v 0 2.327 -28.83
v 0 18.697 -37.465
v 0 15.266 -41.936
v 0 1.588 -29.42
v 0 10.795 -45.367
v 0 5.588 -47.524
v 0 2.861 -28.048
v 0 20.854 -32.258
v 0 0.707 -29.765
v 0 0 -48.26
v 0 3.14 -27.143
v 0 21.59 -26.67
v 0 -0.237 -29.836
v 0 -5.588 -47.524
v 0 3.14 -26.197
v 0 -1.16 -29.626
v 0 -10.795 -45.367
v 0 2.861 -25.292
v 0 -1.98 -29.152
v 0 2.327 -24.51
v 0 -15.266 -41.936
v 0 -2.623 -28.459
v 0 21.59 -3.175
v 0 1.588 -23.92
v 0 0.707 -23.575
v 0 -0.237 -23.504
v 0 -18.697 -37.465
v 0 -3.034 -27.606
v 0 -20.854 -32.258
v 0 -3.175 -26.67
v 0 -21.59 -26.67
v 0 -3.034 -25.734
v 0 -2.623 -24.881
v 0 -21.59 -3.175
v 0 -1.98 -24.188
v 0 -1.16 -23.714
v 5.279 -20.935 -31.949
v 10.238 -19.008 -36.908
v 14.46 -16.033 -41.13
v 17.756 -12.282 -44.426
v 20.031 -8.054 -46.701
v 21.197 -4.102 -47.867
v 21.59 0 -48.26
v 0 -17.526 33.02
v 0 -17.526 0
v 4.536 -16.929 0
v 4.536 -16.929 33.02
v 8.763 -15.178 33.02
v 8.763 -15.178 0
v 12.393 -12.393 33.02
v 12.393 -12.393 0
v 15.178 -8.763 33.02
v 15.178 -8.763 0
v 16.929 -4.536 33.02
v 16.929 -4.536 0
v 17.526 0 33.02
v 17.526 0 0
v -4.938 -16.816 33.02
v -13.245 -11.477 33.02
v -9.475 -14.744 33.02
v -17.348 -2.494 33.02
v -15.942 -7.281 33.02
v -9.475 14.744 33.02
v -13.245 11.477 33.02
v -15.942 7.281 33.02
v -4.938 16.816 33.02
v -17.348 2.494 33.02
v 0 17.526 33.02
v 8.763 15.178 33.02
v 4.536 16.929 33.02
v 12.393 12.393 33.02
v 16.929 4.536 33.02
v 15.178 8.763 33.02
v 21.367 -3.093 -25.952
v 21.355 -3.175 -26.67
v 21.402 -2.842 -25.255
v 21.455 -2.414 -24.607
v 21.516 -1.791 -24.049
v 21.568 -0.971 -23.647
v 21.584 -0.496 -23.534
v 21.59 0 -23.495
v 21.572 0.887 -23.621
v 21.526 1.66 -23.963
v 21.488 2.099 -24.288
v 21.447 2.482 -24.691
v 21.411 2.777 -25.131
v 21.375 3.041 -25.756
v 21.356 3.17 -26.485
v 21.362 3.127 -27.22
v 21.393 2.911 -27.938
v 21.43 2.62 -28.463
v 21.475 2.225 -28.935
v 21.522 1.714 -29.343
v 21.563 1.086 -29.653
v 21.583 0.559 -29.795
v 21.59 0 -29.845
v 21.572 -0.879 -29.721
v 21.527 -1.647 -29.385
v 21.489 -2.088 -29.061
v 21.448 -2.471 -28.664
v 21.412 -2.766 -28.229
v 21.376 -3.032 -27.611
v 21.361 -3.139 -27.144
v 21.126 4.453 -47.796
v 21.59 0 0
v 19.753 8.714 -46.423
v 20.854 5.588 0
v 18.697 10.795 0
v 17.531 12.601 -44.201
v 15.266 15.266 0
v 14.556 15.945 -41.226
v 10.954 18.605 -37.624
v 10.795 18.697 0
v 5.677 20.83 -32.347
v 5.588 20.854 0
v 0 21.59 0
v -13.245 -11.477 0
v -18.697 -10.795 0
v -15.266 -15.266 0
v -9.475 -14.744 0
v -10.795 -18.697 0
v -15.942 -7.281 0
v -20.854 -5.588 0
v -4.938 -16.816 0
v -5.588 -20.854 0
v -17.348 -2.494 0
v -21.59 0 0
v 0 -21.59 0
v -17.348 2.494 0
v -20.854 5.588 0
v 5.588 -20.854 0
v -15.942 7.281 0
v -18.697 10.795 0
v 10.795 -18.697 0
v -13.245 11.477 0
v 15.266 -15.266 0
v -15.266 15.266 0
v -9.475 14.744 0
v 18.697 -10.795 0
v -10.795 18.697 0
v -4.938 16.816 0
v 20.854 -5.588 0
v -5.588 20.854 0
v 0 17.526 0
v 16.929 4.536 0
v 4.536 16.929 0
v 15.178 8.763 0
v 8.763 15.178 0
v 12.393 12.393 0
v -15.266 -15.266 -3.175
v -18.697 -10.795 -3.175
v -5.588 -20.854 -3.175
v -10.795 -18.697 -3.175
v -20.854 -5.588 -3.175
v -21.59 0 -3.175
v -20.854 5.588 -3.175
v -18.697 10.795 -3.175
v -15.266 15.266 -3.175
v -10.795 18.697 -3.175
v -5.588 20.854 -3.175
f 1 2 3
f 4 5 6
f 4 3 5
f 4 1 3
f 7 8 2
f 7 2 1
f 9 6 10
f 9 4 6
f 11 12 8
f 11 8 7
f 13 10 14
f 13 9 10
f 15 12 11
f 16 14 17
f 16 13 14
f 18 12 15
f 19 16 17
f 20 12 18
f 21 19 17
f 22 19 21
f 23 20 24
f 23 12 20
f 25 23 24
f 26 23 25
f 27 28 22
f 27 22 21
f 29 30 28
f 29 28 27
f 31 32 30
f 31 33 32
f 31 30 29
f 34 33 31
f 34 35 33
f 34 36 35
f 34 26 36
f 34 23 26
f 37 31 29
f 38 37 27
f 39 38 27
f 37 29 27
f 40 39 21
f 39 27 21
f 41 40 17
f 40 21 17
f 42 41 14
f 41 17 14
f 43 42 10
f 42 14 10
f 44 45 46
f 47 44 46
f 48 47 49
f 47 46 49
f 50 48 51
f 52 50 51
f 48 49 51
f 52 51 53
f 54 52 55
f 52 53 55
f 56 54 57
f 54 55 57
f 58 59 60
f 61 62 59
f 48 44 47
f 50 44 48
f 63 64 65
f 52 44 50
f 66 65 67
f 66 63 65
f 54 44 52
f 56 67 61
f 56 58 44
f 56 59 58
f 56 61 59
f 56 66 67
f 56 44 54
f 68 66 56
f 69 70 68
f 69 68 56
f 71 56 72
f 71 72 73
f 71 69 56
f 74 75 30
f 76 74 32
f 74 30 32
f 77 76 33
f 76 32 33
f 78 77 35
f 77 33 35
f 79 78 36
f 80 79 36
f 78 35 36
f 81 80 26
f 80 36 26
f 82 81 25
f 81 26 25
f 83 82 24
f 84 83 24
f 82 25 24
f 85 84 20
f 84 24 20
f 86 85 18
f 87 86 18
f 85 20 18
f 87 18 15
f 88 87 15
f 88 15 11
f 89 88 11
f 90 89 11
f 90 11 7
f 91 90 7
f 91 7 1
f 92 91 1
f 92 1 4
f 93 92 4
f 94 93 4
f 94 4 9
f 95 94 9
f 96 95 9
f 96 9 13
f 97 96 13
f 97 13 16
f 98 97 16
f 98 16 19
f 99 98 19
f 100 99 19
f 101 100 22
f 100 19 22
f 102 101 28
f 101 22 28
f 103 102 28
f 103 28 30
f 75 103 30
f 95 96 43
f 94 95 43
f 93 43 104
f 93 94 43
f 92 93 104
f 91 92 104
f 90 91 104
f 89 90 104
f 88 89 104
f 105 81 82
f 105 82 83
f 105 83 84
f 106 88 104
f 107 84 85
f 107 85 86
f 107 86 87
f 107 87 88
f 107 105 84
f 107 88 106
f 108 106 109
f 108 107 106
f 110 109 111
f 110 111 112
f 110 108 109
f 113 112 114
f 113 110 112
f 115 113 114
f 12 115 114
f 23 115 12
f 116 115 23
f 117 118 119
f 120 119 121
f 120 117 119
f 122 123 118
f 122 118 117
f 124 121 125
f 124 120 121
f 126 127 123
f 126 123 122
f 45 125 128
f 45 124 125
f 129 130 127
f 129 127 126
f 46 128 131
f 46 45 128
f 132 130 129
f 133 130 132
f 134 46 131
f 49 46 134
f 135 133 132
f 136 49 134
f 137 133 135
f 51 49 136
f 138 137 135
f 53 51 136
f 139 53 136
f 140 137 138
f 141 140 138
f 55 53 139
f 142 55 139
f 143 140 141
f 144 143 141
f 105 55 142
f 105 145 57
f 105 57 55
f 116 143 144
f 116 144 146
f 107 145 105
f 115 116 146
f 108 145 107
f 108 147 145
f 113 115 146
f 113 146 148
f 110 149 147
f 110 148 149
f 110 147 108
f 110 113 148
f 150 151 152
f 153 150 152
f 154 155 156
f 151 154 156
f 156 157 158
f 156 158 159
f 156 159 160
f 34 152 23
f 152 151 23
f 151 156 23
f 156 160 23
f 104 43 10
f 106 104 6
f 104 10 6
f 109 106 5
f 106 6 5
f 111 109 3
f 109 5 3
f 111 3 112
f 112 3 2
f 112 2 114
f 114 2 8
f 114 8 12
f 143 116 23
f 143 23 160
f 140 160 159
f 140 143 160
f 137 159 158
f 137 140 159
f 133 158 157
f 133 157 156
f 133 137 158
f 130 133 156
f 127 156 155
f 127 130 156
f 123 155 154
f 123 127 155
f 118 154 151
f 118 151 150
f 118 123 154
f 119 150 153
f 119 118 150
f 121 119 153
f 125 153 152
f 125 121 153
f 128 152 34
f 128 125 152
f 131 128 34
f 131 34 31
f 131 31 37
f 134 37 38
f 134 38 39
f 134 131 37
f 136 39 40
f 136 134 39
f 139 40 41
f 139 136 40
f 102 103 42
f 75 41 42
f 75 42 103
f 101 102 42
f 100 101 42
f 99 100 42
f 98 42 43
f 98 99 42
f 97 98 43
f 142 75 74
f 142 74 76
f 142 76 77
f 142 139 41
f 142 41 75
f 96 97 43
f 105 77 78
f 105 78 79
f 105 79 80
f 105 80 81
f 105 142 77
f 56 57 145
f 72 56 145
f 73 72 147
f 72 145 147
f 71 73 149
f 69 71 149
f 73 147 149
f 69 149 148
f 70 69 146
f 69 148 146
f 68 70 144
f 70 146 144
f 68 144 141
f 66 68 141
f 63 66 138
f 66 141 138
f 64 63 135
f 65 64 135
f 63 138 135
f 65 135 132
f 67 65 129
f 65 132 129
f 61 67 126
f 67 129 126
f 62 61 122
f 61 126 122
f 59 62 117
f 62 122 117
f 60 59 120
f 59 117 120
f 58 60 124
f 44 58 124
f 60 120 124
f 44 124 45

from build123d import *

# Parameters (mm, degrees)
F1_DEPTH = 33.02
F2_DEPTH = 48.26
F3_DEPTH = 3.175
F5_DEPTH = 21.591


with BuildPart() as f1:
    # F0 (on Top) → F1 (new body)
    with BuildSketch(Plane.XY):
        with BuildLine():
            Line((0, -17.526), (0, 17.526))
            ThreePointArc((0, 17.526), (-17.526, 0), (0, -17.526))
        make_face()
        with BuildLine():
            ThreePointArc((0, -17.526), (12.3927534471, -12.3927534471), (17.526, 0))
            ThreePointArc((17.526, 0), (12.3927534471, 12.3927534471), (0, 17.526))
            Line((0, 17.526), (0, -17.526))
        make_face()
    extrude(amount=F1_DEPTH)

    # F0 (on Top) → F2 (join)
    with BuildSketch(Plane.XY):
        with BuildLine():
            ThreePointArc((0, -17.526), (12.3927534471, -12.3927534471), (17.526, 0))
            ThreePointArc((17.526, 0), (12.3927534471, 12.3927534471), (0, 17.526))
            Line((0, 17.526), (0, -17.526))
        make_face()
        with BuildLine():
            ThreePointArc((0, 17.526), (12.3927534471, 12.3927534471), (17.526, 0))
            ThreePointArc((17.526, 0), (12.3927534471, -12.3927534471), (0, -17.526))
            Line((0, -17.526), (0, -21.59))
            ThreePointArc((0, -21.59), (15.2664354058, -15.2664354058), (21.59, 0))
            ThreePointArc((21.59, 0), (15.2664354058, 15.2664354058), (0, 21.59))
            Line((0, 21.59), (0, 17.526))
        make_face()
    extrude(amount=-F2_DEPTH)

    # F0 (on Top) → F3 (join)
    with BuildSketch(Plane.XY):
        with BuildLine():
            ThreePointArc((0, -17.526), (-17.526, 0), (0, 17.526))
            Line((0, 17.526), (0, 21.59))
            ThreePointArc((0, 21.59), (-21.59, 0), (0, -21.59))
            Line((0, -21.59), (0, -17.526))
        make_face()
        with BuildLine():
            Line((0, -17.526), (0, 17.526))
            ThreePointArc((0, 17.526), (-17.526, 0), (0, -17.526))
        make_face()
    extrude(amount=-F3_DEPTH)

    # F4 (on face) → F5 (cut, through all)
    with BuildSketch(Plane(origin=(0, 0, 0), x_dir=(0, -1, 0), z_dir=(-1, 0, 0))):
        with BuildLine():
            ThreePointArc((-3.175, -26.67), (0, -29.845), (3.175, -26.67))
            Line((3.175, -26.67), (-3.175, -26.67))
        make_face()
        with BuildLine():
            Line((-3.175, -26.67), (3.175, -26.67))
            ThreePointArc((3.175, -26.67), (0, -23.495), (-3.175, -26.67))
        make_face()
        with BuildLine():
            ThreePointArc((0, -48.26), (-15.2664354058, -41.9364354058), (-21.59, -26.67))
            Line((-21.59, -26.67), (-21.59, -48.26))
            Line((-21.59, -48.26), (0, -48.26))
        make_face()
        with BuildLine():
            Line((21.59, -48.26), (21.59, -26.67))
            ThreePointArc((21.59, -26.67), (15.2664354058, -41.9364354058), (0, -48.26))
            Line((0, -48.26), (21.59, -48.26))
        make_face()
    extrude(amount=-F5_DEPTH, mode=Mode.SUBTRACT)


solid = f1.part
